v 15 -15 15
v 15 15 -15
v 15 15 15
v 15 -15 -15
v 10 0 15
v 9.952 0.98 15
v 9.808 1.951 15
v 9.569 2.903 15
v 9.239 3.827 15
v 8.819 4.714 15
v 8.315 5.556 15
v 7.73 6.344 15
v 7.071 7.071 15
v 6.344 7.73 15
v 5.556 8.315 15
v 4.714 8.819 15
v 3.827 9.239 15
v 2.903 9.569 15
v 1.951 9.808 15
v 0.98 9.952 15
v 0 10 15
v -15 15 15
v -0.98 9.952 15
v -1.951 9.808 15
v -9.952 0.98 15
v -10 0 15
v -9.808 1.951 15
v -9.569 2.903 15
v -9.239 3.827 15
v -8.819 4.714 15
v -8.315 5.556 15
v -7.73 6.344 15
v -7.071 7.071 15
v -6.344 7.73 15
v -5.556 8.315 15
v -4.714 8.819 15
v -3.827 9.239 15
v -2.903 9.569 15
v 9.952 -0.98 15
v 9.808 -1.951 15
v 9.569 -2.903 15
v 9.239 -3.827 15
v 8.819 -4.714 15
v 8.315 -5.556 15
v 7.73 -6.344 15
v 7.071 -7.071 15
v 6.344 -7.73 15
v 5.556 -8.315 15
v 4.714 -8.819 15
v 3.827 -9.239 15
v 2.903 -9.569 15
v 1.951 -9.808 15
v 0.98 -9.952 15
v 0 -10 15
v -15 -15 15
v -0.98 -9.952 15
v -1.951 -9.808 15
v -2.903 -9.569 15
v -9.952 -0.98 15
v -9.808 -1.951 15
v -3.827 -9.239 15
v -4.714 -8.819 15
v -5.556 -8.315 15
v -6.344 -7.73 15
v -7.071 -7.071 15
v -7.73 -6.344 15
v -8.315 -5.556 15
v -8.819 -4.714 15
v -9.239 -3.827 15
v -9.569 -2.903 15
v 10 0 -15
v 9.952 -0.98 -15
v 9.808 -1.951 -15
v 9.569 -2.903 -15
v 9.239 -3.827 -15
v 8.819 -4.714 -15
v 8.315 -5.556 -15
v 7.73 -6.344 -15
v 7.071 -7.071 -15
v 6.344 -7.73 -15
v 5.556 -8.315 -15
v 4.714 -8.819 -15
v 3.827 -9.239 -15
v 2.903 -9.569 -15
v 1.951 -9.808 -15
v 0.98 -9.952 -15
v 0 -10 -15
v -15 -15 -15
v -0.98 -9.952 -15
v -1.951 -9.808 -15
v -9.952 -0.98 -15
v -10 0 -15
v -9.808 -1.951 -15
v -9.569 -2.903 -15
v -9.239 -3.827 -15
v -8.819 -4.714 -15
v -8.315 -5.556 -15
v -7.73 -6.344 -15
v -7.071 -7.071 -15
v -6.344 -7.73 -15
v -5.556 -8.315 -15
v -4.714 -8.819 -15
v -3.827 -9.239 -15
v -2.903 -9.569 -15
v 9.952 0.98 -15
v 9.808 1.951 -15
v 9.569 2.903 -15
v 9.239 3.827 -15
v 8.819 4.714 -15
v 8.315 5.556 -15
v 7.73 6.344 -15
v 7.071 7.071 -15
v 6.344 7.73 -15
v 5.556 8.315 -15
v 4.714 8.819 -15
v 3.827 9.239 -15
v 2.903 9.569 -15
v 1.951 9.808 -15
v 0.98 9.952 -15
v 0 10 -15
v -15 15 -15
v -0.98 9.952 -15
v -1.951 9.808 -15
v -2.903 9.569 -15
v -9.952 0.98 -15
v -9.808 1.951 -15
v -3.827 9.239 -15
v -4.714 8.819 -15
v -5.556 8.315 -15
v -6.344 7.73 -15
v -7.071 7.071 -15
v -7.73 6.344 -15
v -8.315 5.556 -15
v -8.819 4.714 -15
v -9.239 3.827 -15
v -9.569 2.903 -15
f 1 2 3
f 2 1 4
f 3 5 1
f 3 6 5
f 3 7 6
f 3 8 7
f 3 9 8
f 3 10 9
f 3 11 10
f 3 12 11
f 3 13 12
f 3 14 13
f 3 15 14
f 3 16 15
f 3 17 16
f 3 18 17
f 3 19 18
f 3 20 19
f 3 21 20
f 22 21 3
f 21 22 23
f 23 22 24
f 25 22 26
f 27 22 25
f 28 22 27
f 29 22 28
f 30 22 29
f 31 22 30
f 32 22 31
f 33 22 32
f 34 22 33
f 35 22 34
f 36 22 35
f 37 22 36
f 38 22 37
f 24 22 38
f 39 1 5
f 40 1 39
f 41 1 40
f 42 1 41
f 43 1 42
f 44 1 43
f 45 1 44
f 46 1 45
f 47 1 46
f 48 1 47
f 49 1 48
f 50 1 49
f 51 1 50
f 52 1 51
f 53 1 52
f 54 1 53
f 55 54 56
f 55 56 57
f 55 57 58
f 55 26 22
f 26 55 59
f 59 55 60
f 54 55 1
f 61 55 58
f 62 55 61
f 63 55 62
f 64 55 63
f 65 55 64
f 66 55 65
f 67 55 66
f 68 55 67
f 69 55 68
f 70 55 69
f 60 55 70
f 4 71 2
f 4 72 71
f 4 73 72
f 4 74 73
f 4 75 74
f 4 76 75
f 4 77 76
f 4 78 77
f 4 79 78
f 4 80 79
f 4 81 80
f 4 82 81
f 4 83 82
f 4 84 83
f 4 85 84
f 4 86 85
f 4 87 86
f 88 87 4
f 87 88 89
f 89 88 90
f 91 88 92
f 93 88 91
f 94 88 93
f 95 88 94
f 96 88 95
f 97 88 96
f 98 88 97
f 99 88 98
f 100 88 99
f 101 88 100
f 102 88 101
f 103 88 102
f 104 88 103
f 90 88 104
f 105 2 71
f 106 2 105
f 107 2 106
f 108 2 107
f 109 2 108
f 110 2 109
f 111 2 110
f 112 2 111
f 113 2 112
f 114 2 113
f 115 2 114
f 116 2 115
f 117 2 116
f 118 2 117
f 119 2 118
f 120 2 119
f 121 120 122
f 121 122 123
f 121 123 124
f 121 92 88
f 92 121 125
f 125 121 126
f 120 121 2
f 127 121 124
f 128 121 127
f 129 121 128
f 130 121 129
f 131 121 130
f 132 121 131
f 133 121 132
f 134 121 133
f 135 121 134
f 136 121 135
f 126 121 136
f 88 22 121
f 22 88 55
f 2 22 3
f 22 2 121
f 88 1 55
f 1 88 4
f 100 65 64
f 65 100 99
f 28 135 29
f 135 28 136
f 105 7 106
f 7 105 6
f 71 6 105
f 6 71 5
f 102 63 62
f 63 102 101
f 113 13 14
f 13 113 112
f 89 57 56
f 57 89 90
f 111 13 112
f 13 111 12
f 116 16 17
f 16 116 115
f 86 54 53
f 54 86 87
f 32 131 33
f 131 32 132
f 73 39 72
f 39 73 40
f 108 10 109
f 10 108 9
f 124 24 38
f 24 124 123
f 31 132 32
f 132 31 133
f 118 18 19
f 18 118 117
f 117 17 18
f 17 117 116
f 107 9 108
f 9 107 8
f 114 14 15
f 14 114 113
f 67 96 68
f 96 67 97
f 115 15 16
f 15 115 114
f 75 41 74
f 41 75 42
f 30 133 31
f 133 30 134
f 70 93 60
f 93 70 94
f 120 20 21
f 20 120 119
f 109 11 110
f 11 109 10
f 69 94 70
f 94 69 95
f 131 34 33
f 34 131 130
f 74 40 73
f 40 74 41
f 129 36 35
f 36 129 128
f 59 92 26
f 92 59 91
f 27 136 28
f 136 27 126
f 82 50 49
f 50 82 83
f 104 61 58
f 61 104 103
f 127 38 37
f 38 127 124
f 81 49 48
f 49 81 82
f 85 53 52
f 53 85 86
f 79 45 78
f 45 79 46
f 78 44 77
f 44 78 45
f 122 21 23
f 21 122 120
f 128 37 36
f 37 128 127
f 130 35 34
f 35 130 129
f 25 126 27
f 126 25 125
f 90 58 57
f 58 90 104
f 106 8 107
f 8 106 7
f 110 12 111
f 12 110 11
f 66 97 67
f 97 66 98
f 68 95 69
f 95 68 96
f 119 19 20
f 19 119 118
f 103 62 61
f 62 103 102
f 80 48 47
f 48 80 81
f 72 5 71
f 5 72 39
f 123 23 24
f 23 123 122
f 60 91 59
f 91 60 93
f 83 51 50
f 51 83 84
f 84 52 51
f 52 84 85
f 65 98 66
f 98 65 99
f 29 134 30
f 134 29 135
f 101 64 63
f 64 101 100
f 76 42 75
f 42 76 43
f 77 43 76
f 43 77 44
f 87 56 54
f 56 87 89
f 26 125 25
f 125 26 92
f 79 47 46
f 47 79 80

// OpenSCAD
// Volume: 17590.35549678037, SurfaceArea: 6656.888963666461
wall = 2;
size = 30;
hole_r = 10;

// Difference: cube with cylindrical hole
difference() {
    cube([size, size, size], center=true);
    cylinder(h=size + 1, r=hole_r, center=true, $fn=64);
}
